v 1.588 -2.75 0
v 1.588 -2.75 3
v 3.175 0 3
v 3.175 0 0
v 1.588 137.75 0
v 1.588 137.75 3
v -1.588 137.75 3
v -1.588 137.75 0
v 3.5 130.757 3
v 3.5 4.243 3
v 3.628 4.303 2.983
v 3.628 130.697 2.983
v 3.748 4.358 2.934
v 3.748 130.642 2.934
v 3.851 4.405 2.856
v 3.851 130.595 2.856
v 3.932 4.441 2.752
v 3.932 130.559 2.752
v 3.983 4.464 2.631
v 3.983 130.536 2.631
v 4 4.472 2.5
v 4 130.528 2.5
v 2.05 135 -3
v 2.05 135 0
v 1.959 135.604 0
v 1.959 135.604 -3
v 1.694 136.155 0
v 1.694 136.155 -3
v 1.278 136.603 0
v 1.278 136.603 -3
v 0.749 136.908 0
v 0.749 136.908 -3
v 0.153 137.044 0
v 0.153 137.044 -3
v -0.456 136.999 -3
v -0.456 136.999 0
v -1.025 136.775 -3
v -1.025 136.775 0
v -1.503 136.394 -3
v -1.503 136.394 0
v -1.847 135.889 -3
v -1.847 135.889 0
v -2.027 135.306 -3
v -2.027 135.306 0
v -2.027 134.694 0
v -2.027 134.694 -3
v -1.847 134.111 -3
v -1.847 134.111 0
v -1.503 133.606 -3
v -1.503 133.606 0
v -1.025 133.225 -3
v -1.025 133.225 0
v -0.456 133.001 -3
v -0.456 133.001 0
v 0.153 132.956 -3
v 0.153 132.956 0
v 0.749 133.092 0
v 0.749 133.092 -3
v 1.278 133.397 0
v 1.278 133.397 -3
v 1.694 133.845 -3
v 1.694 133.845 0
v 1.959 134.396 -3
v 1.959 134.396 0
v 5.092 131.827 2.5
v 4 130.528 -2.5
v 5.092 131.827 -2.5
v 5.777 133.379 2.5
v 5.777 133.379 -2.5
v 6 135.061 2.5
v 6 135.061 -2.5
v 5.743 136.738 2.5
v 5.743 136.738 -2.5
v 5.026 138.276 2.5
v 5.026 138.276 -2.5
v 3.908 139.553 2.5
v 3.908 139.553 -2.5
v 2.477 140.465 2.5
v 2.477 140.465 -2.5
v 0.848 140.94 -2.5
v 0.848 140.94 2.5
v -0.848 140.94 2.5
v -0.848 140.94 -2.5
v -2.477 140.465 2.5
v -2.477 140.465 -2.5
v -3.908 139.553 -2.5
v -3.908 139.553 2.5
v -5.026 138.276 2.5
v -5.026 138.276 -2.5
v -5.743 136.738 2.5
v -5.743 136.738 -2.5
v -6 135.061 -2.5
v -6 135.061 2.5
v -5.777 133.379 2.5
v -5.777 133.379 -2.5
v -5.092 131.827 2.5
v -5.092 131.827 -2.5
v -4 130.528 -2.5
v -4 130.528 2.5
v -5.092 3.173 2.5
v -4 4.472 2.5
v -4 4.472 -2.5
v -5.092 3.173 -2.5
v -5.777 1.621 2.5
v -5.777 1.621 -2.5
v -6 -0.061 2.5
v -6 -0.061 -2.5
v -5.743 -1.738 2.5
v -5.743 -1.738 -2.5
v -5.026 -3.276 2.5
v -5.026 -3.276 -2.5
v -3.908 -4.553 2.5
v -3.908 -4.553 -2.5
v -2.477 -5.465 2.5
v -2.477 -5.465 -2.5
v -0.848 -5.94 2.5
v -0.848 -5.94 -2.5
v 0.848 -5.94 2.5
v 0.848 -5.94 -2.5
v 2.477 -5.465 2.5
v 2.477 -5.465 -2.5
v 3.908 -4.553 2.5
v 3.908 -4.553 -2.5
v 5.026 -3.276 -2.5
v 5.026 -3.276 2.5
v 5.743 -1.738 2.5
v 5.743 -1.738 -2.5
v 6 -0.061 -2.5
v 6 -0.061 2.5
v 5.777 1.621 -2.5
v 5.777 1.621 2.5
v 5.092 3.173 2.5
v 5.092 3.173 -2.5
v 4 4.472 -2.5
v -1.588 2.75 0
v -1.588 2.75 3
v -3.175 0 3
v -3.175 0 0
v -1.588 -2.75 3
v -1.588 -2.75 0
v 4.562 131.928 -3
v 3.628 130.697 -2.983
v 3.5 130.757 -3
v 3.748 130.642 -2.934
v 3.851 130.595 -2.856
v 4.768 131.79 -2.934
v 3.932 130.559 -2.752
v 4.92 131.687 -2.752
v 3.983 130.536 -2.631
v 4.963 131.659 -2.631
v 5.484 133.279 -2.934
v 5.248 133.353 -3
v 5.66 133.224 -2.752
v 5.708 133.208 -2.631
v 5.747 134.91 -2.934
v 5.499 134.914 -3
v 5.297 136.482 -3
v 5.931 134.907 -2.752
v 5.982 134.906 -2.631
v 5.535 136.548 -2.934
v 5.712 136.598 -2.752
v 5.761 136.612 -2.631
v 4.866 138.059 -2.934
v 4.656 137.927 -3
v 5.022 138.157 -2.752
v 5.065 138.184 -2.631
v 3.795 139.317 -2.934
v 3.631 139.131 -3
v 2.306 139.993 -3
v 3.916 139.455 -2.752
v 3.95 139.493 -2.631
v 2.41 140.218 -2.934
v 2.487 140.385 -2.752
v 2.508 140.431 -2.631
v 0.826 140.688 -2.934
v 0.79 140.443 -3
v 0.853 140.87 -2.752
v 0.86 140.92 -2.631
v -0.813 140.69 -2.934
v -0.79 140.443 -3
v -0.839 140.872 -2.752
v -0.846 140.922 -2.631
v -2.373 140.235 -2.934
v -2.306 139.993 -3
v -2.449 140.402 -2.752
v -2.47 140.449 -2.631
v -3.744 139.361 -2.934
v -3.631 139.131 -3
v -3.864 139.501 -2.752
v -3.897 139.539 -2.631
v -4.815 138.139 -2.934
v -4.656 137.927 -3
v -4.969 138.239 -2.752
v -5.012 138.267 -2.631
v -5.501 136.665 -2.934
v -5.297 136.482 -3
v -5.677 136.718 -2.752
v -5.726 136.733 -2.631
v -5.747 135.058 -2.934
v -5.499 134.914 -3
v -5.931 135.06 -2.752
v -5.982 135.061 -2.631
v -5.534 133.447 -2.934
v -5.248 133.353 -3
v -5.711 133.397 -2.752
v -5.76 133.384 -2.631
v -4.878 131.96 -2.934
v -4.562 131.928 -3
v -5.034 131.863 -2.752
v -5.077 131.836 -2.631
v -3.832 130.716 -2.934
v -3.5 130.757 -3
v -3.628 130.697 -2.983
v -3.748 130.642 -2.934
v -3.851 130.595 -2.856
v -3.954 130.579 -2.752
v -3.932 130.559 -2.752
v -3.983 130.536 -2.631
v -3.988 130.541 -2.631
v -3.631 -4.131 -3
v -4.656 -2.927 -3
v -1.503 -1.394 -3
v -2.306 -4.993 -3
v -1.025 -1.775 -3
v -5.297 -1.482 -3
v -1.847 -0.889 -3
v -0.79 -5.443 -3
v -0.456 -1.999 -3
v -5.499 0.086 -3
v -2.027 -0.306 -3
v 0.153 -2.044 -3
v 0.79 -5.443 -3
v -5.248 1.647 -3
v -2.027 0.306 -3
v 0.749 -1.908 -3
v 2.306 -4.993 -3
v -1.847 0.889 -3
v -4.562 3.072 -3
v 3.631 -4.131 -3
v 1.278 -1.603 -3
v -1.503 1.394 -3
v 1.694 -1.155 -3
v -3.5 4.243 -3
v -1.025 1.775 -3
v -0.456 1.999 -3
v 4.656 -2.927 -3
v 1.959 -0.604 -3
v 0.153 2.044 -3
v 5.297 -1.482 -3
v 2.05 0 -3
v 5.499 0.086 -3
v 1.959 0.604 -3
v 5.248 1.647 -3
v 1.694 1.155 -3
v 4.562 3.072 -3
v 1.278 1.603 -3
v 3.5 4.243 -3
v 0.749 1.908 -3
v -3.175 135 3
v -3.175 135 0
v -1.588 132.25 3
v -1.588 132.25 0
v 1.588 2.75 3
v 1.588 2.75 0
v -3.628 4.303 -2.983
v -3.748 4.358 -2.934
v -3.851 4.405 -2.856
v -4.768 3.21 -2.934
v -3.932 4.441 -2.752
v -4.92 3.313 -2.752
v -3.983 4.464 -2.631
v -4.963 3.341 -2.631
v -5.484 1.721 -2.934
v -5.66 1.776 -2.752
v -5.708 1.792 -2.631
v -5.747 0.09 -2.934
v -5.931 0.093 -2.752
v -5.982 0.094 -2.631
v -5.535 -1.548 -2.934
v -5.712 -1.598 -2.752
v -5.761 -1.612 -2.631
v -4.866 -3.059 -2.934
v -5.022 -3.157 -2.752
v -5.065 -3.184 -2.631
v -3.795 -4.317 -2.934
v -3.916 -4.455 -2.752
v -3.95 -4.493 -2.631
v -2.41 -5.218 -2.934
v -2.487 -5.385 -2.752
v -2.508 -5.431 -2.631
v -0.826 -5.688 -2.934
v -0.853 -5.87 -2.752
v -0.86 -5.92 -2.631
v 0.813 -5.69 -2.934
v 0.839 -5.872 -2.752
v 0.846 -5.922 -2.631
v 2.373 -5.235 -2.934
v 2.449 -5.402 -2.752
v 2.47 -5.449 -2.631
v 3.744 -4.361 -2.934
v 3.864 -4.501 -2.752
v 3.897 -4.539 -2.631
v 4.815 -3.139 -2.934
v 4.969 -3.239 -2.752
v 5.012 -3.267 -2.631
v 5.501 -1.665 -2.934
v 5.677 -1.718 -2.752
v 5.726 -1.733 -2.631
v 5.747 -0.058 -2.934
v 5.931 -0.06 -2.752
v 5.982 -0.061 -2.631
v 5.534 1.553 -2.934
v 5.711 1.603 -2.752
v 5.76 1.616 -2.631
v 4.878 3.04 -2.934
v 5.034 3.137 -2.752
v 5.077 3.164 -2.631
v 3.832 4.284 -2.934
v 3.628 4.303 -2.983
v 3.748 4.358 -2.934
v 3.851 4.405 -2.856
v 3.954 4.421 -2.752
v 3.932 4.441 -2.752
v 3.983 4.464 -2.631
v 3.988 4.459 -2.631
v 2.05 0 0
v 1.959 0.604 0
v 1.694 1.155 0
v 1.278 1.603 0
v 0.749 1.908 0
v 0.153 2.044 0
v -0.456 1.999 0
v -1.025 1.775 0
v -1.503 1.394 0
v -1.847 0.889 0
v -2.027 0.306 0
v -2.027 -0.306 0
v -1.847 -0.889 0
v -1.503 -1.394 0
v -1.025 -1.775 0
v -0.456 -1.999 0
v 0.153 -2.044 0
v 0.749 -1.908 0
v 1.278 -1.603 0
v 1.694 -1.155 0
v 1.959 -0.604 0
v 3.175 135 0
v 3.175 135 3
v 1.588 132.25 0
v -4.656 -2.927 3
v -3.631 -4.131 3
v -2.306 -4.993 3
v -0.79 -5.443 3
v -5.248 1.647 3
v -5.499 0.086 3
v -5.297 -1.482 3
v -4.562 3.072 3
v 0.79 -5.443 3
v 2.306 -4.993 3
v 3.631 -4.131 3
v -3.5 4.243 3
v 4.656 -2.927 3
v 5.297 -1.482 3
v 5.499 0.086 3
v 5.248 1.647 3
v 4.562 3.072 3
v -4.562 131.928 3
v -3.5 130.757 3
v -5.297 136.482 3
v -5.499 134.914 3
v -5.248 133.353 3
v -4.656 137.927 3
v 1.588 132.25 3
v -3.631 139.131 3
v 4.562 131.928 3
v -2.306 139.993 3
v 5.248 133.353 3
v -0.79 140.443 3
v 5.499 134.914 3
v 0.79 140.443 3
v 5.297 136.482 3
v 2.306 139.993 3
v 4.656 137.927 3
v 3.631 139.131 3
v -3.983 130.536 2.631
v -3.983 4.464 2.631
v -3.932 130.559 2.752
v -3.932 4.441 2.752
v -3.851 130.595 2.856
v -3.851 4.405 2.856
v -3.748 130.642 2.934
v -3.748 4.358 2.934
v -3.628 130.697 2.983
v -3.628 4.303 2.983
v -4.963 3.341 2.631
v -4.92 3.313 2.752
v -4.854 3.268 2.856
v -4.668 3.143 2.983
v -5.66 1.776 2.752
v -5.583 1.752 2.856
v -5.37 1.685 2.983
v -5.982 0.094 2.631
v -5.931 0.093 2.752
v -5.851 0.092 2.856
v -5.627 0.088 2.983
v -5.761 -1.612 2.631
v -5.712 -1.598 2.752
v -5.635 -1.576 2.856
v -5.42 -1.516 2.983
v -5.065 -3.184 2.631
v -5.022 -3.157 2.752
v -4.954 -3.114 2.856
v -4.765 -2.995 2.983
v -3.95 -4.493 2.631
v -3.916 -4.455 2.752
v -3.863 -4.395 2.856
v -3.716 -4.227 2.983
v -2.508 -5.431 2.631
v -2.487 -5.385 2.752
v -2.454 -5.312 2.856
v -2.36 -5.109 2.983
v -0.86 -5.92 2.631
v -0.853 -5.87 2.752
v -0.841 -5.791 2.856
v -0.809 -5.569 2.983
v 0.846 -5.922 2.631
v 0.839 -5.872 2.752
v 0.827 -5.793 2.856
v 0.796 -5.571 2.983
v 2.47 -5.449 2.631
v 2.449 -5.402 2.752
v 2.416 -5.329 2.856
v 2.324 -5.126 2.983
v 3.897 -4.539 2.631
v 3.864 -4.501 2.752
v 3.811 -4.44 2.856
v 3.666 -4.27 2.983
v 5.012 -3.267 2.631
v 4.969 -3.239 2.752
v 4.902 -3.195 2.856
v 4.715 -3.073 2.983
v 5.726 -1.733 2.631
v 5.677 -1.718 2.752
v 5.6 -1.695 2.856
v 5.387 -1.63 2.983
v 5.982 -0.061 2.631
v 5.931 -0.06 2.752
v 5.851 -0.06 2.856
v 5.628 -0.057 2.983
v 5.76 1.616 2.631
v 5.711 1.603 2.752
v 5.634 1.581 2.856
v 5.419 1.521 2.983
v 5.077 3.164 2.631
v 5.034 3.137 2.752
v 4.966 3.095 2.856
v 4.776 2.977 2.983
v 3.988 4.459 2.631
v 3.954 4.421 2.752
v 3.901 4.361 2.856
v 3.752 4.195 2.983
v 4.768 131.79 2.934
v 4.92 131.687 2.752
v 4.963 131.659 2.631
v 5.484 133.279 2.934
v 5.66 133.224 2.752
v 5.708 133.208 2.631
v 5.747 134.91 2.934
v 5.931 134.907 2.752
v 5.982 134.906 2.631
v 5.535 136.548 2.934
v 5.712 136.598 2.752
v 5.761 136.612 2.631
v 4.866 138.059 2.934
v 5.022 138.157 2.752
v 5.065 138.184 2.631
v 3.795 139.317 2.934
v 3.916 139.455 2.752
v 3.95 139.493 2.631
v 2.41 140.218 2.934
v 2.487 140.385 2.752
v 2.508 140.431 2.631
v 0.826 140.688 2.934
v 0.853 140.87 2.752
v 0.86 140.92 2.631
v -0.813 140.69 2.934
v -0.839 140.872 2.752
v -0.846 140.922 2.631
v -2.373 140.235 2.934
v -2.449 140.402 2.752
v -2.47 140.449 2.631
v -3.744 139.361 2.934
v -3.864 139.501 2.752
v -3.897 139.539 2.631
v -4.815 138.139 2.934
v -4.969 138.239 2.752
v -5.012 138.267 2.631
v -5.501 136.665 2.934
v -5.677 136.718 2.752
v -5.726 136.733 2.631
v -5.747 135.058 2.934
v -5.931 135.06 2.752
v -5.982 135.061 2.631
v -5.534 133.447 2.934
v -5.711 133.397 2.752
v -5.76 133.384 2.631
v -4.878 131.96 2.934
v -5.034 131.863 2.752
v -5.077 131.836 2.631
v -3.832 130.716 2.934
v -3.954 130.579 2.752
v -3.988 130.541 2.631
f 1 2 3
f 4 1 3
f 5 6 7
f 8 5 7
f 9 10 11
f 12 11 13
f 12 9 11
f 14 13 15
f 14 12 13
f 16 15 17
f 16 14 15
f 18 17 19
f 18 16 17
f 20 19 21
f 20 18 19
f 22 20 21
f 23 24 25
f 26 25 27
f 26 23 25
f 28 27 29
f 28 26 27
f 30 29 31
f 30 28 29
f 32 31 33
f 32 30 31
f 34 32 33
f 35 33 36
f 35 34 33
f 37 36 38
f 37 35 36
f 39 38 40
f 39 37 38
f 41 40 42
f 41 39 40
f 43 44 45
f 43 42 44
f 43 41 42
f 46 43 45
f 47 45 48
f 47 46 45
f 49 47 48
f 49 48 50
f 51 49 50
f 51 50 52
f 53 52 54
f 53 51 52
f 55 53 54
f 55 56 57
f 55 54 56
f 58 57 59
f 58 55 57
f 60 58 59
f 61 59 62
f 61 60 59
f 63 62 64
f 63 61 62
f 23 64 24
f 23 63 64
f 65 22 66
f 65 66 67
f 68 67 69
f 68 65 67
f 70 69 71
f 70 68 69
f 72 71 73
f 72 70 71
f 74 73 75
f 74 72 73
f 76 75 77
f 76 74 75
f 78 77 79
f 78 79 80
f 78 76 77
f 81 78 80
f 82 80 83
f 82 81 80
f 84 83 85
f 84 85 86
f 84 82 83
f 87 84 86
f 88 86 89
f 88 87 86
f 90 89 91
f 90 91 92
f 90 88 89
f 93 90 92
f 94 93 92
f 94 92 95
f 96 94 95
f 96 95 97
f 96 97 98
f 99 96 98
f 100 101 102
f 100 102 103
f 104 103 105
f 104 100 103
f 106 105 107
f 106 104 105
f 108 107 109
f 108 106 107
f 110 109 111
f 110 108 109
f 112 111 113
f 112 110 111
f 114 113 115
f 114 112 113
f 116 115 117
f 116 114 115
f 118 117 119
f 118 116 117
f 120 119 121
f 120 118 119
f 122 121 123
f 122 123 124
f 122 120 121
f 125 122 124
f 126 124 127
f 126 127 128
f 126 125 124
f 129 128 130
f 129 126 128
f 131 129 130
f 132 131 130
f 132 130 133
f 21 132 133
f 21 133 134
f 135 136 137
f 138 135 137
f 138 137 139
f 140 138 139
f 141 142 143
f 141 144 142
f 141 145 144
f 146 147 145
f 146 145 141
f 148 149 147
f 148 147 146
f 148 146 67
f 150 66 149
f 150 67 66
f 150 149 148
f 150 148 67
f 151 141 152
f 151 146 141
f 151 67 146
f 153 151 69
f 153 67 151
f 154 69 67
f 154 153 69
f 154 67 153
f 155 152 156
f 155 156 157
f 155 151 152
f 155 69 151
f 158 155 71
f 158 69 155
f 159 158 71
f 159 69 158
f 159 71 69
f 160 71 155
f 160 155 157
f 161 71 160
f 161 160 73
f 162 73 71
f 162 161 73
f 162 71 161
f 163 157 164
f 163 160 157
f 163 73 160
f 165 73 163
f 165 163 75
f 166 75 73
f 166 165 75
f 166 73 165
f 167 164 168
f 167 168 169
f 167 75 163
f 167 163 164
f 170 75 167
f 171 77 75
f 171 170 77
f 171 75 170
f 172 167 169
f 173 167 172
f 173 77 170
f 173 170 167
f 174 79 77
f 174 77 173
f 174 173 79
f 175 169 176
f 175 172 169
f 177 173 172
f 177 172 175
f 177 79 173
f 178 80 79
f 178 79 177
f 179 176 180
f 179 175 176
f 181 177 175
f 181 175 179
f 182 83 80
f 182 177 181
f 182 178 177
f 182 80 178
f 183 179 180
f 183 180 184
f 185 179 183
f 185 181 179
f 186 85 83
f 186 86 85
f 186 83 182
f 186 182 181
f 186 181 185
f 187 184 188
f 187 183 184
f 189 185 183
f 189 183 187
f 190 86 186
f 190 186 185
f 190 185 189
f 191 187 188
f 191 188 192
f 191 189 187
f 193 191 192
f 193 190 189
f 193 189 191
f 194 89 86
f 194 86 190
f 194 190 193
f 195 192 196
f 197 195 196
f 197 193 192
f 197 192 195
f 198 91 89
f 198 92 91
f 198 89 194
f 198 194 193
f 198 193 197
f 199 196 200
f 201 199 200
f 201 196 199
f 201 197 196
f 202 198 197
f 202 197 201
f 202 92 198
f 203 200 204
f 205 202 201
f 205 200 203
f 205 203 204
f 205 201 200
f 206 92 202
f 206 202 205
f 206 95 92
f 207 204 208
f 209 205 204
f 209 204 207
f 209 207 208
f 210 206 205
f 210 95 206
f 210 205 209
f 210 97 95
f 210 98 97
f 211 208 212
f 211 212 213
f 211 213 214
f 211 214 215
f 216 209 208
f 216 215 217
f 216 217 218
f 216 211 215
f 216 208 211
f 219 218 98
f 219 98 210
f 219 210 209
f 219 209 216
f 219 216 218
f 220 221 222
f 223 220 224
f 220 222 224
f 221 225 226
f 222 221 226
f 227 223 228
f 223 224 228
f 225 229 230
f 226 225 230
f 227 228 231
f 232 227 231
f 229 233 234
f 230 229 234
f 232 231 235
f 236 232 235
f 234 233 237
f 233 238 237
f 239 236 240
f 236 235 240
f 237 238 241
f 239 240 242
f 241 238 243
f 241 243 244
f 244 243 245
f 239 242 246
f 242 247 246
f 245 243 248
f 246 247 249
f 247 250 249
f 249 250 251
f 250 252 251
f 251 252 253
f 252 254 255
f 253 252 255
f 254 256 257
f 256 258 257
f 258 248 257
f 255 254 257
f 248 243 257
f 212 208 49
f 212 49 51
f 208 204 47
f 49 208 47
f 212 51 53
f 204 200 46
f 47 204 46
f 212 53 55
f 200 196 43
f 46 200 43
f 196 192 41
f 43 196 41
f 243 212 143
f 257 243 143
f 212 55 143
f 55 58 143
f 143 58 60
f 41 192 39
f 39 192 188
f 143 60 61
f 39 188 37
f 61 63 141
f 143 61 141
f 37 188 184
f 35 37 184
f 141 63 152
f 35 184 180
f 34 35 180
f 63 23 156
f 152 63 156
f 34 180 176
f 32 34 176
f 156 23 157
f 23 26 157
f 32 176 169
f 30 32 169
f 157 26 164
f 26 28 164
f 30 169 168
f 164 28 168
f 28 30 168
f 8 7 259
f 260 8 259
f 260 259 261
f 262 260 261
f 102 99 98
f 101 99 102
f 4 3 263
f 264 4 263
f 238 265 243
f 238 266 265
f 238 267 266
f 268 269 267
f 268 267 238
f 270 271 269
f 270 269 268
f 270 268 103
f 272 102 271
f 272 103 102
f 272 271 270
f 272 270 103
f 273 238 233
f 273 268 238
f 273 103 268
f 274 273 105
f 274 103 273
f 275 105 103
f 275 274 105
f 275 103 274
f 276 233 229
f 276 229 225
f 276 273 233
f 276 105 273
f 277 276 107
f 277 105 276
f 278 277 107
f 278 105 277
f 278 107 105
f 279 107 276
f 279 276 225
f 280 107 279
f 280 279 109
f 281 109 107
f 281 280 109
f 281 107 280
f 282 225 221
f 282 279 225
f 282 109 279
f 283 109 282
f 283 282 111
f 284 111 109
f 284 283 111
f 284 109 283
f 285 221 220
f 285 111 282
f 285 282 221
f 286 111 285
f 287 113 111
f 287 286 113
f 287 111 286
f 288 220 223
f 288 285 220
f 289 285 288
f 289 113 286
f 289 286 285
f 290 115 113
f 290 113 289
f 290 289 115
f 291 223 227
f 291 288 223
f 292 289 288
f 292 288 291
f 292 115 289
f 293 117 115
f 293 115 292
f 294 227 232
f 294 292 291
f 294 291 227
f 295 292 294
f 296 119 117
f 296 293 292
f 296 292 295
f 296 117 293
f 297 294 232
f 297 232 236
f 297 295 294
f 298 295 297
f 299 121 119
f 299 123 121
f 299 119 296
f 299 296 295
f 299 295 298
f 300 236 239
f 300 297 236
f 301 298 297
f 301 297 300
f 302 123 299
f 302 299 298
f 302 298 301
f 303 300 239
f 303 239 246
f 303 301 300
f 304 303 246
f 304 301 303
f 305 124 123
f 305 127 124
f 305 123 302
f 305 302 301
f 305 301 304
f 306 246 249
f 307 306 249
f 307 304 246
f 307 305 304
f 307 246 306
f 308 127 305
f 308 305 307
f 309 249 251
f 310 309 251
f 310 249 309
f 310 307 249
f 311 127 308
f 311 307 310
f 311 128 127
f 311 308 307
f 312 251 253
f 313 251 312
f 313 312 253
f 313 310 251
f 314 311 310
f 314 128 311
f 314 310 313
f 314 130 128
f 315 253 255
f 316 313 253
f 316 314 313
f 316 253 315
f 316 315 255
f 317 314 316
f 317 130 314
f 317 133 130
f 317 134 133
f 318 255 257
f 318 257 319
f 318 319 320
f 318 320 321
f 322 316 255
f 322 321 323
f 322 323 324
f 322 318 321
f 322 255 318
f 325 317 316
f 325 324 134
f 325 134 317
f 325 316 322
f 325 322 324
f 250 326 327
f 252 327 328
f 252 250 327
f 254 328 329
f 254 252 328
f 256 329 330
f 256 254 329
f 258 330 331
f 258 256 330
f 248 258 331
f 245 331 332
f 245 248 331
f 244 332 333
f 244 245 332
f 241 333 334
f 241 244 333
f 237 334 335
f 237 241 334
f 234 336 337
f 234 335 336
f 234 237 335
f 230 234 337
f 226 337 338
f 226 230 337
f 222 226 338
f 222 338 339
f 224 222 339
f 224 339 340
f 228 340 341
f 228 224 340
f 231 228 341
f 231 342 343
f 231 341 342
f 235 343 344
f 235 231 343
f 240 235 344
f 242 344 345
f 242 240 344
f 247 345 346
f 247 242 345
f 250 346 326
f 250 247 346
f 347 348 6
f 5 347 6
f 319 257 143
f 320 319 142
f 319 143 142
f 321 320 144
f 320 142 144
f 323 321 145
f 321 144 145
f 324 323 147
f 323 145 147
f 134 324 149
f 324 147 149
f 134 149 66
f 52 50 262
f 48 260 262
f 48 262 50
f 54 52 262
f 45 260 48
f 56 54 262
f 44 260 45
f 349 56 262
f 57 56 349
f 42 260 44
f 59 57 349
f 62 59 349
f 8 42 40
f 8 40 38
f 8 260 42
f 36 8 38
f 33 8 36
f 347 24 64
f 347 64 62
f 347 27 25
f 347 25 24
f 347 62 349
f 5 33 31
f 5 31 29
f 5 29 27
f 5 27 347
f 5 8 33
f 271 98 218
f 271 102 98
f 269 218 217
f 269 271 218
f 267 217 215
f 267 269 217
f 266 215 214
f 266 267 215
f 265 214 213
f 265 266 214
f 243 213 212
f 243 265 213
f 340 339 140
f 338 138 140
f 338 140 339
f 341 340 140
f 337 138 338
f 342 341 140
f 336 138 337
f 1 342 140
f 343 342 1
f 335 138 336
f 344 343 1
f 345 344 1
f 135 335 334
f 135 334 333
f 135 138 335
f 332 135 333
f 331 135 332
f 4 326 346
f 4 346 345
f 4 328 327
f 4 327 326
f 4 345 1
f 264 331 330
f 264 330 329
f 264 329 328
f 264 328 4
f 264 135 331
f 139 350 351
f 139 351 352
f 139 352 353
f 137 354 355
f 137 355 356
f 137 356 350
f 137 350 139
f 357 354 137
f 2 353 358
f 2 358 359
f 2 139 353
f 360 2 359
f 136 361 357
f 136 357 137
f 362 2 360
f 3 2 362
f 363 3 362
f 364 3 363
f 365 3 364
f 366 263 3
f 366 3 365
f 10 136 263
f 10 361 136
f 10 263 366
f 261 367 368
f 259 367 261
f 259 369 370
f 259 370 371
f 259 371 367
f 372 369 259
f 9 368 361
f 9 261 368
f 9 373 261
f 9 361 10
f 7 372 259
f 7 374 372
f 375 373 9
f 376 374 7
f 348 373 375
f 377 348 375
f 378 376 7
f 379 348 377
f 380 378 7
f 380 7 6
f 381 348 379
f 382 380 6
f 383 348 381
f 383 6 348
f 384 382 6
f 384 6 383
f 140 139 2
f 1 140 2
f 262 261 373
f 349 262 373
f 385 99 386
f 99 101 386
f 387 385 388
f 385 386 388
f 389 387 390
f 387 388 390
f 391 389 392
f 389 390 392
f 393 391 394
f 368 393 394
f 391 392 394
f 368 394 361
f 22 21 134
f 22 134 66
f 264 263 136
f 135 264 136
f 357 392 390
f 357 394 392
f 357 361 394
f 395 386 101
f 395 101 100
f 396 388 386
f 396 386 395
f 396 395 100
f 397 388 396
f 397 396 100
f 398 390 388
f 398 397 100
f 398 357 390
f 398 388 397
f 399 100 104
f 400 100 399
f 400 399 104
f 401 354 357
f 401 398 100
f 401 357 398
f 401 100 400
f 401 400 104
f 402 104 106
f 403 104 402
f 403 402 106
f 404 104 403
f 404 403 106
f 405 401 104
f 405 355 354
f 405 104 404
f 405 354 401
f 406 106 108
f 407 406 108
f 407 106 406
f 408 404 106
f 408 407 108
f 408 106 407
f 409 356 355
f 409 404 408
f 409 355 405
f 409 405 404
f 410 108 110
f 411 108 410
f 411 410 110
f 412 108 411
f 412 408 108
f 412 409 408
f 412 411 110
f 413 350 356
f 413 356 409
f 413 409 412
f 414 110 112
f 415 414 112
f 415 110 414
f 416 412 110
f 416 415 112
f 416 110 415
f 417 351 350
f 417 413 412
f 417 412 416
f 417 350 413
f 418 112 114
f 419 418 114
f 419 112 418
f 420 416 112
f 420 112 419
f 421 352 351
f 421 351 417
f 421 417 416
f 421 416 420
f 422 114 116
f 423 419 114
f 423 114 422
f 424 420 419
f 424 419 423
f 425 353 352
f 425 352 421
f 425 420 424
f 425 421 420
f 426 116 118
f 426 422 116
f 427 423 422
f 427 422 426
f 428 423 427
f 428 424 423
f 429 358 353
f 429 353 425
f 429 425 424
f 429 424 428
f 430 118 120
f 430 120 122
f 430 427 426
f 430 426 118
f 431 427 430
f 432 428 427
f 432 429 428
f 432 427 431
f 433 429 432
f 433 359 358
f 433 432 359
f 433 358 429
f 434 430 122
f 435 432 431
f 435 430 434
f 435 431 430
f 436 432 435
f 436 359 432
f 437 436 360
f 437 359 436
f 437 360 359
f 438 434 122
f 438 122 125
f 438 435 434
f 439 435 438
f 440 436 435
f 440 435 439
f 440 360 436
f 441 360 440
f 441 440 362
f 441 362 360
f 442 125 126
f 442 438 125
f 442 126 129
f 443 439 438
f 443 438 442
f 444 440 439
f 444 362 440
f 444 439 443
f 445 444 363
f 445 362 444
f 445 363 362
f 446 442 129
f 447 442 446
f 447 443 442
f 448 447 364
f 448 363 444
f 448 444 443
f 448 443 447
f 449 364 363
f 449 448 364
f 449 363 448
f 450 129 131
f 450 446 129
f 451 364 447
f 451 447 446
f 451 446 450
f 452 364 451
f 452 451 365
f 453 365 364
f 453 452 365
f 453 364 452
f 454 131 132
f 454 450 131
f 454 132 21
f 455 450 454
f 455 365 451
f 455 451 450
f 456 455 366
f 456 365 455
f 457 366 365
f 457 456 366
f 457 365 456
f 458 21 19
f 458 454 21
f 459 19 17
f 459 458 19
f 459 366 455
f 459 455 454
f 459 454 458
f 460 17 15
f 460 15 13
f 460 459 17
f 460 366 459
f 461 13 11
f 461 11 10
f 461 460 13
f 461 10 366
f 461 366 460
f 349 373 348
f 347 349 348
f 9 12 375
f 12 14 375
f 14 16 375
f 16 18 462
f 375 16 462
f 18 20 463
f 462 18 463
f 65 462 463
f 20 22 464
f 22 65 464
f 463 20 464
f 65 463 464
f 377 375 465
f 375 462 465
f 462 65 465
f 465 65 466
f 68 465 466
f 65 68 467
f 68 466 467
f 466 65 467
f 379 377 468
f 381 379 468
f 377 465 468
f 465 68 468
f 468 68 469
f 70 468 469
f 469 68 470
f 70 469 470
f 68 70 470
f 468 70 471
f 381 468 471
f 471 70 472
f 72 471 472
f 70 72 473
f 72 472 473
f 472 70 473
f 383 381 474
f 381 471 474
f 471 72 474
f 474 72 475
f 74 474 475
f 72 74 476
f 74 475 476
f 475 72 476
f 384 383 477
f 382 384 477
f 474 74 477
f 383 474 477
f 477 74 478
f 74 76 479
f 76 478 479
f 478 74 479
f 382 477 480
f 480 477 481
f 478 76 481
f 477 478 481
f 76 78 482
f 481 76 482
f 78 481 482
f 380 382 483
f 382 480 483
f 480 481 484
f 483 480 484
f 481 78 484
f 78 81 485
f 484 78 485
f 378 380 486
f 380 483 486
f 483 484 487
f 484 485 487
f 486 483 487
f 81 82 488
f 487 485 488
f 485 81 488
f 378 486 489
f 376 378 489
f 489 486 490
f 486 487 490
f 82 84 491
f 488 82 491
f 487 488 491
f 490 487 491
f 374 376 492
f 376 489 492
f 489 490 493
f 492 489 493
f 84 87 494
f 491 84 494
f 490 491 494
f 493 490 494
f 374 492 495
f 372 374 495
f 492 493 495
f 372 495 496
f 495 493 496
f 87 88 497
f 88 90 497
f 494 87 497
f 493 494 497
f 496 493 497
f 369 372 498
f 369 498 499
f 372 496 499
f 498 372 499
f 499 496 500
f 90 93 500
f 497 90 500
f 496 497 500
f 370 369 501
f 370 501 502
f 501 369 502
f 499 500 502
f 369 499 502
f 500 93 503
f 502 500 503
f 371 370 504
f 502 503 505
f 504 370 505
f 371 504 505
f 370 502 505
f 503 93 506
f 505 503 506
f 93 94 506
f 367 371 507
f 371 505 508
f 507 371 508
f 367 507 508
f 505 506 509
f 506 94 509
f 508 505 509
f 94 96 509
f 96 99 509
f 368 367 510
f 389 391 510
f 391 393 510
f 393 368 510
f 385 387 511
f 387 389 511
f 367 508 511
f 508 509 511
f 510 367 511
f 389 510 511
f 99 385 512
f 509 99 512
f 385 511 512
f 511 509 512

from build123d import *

# Parameters (mm, degrees)
SKETCH_1_R          = 2.05
EXTRUDE_1_DEPTH     = 3
CUT_EXTRUDE_1_DEPTH = 3
FILLET_1_R          = 0.5


with BuildPart() as part:
    # 草图1 → 凸台-拉伸1 (new, symmetric)
    with BuildSketch(Plane.XY):
        with BuildLine():
            Line((-4, 130.527864045), (-4, 4.472135955))
            ThreePointArc((-4, 4.472135955), (0, -6), (4, 4.472135955))
            Line((4, 4.472135955), (4, 130.527864045))
            ThreePointArc((4, 130.527864045), (0, 141), (-4, 130.527864045))
        make_face()
        Circle(SKETCH_1_R, mode=Mode.SUBTRACT)
        with Locations((0, 135)):
            Circle(SKETCH_1_R, mode=Mode.SUBTRACT)
    extrude(amount=EXTRUDE_1_DEPTH, both=True)

    # 草图2 → 切除-拉伸1 (cut)
    with BuildSketch(Plane.XY.offset(3)):
        Polygon((1.58771324, -2.75), (3.175426481, 0), (1.58771324, 2.75), (-1.58771324, 2.75), (-3.175426481, 0), (-1.58771324, -2.75), align=None)
        Polygon((1.58771324, 132.25), (3.175426481, 135), (1.58771324, 137.75), (-1.58771324, 137.75), (-3.175426481, 135), (-1.58771324, 132.25), align=None)
    extrude(amount=-CUT_EXTRUDE_1_DEPTH, mode=Mode.SUBTRACT)

    # 圆角1
    fillet_1_edges = [part.edges().sort_by_distance(p)[0] for p in [
        (-4, 67.5, 3),
        (0, -6, 3),
        (4, 67.5, 3),
        (0, 141, 3),
        (0, 141, -3),
        (4, 67.5, -3),
        (0, -6, -3),
        (-4, 67.5, -3),
    ]]
    fillet(fillet_1_edges, radius=FILLET_1_R)


solid = part.part
